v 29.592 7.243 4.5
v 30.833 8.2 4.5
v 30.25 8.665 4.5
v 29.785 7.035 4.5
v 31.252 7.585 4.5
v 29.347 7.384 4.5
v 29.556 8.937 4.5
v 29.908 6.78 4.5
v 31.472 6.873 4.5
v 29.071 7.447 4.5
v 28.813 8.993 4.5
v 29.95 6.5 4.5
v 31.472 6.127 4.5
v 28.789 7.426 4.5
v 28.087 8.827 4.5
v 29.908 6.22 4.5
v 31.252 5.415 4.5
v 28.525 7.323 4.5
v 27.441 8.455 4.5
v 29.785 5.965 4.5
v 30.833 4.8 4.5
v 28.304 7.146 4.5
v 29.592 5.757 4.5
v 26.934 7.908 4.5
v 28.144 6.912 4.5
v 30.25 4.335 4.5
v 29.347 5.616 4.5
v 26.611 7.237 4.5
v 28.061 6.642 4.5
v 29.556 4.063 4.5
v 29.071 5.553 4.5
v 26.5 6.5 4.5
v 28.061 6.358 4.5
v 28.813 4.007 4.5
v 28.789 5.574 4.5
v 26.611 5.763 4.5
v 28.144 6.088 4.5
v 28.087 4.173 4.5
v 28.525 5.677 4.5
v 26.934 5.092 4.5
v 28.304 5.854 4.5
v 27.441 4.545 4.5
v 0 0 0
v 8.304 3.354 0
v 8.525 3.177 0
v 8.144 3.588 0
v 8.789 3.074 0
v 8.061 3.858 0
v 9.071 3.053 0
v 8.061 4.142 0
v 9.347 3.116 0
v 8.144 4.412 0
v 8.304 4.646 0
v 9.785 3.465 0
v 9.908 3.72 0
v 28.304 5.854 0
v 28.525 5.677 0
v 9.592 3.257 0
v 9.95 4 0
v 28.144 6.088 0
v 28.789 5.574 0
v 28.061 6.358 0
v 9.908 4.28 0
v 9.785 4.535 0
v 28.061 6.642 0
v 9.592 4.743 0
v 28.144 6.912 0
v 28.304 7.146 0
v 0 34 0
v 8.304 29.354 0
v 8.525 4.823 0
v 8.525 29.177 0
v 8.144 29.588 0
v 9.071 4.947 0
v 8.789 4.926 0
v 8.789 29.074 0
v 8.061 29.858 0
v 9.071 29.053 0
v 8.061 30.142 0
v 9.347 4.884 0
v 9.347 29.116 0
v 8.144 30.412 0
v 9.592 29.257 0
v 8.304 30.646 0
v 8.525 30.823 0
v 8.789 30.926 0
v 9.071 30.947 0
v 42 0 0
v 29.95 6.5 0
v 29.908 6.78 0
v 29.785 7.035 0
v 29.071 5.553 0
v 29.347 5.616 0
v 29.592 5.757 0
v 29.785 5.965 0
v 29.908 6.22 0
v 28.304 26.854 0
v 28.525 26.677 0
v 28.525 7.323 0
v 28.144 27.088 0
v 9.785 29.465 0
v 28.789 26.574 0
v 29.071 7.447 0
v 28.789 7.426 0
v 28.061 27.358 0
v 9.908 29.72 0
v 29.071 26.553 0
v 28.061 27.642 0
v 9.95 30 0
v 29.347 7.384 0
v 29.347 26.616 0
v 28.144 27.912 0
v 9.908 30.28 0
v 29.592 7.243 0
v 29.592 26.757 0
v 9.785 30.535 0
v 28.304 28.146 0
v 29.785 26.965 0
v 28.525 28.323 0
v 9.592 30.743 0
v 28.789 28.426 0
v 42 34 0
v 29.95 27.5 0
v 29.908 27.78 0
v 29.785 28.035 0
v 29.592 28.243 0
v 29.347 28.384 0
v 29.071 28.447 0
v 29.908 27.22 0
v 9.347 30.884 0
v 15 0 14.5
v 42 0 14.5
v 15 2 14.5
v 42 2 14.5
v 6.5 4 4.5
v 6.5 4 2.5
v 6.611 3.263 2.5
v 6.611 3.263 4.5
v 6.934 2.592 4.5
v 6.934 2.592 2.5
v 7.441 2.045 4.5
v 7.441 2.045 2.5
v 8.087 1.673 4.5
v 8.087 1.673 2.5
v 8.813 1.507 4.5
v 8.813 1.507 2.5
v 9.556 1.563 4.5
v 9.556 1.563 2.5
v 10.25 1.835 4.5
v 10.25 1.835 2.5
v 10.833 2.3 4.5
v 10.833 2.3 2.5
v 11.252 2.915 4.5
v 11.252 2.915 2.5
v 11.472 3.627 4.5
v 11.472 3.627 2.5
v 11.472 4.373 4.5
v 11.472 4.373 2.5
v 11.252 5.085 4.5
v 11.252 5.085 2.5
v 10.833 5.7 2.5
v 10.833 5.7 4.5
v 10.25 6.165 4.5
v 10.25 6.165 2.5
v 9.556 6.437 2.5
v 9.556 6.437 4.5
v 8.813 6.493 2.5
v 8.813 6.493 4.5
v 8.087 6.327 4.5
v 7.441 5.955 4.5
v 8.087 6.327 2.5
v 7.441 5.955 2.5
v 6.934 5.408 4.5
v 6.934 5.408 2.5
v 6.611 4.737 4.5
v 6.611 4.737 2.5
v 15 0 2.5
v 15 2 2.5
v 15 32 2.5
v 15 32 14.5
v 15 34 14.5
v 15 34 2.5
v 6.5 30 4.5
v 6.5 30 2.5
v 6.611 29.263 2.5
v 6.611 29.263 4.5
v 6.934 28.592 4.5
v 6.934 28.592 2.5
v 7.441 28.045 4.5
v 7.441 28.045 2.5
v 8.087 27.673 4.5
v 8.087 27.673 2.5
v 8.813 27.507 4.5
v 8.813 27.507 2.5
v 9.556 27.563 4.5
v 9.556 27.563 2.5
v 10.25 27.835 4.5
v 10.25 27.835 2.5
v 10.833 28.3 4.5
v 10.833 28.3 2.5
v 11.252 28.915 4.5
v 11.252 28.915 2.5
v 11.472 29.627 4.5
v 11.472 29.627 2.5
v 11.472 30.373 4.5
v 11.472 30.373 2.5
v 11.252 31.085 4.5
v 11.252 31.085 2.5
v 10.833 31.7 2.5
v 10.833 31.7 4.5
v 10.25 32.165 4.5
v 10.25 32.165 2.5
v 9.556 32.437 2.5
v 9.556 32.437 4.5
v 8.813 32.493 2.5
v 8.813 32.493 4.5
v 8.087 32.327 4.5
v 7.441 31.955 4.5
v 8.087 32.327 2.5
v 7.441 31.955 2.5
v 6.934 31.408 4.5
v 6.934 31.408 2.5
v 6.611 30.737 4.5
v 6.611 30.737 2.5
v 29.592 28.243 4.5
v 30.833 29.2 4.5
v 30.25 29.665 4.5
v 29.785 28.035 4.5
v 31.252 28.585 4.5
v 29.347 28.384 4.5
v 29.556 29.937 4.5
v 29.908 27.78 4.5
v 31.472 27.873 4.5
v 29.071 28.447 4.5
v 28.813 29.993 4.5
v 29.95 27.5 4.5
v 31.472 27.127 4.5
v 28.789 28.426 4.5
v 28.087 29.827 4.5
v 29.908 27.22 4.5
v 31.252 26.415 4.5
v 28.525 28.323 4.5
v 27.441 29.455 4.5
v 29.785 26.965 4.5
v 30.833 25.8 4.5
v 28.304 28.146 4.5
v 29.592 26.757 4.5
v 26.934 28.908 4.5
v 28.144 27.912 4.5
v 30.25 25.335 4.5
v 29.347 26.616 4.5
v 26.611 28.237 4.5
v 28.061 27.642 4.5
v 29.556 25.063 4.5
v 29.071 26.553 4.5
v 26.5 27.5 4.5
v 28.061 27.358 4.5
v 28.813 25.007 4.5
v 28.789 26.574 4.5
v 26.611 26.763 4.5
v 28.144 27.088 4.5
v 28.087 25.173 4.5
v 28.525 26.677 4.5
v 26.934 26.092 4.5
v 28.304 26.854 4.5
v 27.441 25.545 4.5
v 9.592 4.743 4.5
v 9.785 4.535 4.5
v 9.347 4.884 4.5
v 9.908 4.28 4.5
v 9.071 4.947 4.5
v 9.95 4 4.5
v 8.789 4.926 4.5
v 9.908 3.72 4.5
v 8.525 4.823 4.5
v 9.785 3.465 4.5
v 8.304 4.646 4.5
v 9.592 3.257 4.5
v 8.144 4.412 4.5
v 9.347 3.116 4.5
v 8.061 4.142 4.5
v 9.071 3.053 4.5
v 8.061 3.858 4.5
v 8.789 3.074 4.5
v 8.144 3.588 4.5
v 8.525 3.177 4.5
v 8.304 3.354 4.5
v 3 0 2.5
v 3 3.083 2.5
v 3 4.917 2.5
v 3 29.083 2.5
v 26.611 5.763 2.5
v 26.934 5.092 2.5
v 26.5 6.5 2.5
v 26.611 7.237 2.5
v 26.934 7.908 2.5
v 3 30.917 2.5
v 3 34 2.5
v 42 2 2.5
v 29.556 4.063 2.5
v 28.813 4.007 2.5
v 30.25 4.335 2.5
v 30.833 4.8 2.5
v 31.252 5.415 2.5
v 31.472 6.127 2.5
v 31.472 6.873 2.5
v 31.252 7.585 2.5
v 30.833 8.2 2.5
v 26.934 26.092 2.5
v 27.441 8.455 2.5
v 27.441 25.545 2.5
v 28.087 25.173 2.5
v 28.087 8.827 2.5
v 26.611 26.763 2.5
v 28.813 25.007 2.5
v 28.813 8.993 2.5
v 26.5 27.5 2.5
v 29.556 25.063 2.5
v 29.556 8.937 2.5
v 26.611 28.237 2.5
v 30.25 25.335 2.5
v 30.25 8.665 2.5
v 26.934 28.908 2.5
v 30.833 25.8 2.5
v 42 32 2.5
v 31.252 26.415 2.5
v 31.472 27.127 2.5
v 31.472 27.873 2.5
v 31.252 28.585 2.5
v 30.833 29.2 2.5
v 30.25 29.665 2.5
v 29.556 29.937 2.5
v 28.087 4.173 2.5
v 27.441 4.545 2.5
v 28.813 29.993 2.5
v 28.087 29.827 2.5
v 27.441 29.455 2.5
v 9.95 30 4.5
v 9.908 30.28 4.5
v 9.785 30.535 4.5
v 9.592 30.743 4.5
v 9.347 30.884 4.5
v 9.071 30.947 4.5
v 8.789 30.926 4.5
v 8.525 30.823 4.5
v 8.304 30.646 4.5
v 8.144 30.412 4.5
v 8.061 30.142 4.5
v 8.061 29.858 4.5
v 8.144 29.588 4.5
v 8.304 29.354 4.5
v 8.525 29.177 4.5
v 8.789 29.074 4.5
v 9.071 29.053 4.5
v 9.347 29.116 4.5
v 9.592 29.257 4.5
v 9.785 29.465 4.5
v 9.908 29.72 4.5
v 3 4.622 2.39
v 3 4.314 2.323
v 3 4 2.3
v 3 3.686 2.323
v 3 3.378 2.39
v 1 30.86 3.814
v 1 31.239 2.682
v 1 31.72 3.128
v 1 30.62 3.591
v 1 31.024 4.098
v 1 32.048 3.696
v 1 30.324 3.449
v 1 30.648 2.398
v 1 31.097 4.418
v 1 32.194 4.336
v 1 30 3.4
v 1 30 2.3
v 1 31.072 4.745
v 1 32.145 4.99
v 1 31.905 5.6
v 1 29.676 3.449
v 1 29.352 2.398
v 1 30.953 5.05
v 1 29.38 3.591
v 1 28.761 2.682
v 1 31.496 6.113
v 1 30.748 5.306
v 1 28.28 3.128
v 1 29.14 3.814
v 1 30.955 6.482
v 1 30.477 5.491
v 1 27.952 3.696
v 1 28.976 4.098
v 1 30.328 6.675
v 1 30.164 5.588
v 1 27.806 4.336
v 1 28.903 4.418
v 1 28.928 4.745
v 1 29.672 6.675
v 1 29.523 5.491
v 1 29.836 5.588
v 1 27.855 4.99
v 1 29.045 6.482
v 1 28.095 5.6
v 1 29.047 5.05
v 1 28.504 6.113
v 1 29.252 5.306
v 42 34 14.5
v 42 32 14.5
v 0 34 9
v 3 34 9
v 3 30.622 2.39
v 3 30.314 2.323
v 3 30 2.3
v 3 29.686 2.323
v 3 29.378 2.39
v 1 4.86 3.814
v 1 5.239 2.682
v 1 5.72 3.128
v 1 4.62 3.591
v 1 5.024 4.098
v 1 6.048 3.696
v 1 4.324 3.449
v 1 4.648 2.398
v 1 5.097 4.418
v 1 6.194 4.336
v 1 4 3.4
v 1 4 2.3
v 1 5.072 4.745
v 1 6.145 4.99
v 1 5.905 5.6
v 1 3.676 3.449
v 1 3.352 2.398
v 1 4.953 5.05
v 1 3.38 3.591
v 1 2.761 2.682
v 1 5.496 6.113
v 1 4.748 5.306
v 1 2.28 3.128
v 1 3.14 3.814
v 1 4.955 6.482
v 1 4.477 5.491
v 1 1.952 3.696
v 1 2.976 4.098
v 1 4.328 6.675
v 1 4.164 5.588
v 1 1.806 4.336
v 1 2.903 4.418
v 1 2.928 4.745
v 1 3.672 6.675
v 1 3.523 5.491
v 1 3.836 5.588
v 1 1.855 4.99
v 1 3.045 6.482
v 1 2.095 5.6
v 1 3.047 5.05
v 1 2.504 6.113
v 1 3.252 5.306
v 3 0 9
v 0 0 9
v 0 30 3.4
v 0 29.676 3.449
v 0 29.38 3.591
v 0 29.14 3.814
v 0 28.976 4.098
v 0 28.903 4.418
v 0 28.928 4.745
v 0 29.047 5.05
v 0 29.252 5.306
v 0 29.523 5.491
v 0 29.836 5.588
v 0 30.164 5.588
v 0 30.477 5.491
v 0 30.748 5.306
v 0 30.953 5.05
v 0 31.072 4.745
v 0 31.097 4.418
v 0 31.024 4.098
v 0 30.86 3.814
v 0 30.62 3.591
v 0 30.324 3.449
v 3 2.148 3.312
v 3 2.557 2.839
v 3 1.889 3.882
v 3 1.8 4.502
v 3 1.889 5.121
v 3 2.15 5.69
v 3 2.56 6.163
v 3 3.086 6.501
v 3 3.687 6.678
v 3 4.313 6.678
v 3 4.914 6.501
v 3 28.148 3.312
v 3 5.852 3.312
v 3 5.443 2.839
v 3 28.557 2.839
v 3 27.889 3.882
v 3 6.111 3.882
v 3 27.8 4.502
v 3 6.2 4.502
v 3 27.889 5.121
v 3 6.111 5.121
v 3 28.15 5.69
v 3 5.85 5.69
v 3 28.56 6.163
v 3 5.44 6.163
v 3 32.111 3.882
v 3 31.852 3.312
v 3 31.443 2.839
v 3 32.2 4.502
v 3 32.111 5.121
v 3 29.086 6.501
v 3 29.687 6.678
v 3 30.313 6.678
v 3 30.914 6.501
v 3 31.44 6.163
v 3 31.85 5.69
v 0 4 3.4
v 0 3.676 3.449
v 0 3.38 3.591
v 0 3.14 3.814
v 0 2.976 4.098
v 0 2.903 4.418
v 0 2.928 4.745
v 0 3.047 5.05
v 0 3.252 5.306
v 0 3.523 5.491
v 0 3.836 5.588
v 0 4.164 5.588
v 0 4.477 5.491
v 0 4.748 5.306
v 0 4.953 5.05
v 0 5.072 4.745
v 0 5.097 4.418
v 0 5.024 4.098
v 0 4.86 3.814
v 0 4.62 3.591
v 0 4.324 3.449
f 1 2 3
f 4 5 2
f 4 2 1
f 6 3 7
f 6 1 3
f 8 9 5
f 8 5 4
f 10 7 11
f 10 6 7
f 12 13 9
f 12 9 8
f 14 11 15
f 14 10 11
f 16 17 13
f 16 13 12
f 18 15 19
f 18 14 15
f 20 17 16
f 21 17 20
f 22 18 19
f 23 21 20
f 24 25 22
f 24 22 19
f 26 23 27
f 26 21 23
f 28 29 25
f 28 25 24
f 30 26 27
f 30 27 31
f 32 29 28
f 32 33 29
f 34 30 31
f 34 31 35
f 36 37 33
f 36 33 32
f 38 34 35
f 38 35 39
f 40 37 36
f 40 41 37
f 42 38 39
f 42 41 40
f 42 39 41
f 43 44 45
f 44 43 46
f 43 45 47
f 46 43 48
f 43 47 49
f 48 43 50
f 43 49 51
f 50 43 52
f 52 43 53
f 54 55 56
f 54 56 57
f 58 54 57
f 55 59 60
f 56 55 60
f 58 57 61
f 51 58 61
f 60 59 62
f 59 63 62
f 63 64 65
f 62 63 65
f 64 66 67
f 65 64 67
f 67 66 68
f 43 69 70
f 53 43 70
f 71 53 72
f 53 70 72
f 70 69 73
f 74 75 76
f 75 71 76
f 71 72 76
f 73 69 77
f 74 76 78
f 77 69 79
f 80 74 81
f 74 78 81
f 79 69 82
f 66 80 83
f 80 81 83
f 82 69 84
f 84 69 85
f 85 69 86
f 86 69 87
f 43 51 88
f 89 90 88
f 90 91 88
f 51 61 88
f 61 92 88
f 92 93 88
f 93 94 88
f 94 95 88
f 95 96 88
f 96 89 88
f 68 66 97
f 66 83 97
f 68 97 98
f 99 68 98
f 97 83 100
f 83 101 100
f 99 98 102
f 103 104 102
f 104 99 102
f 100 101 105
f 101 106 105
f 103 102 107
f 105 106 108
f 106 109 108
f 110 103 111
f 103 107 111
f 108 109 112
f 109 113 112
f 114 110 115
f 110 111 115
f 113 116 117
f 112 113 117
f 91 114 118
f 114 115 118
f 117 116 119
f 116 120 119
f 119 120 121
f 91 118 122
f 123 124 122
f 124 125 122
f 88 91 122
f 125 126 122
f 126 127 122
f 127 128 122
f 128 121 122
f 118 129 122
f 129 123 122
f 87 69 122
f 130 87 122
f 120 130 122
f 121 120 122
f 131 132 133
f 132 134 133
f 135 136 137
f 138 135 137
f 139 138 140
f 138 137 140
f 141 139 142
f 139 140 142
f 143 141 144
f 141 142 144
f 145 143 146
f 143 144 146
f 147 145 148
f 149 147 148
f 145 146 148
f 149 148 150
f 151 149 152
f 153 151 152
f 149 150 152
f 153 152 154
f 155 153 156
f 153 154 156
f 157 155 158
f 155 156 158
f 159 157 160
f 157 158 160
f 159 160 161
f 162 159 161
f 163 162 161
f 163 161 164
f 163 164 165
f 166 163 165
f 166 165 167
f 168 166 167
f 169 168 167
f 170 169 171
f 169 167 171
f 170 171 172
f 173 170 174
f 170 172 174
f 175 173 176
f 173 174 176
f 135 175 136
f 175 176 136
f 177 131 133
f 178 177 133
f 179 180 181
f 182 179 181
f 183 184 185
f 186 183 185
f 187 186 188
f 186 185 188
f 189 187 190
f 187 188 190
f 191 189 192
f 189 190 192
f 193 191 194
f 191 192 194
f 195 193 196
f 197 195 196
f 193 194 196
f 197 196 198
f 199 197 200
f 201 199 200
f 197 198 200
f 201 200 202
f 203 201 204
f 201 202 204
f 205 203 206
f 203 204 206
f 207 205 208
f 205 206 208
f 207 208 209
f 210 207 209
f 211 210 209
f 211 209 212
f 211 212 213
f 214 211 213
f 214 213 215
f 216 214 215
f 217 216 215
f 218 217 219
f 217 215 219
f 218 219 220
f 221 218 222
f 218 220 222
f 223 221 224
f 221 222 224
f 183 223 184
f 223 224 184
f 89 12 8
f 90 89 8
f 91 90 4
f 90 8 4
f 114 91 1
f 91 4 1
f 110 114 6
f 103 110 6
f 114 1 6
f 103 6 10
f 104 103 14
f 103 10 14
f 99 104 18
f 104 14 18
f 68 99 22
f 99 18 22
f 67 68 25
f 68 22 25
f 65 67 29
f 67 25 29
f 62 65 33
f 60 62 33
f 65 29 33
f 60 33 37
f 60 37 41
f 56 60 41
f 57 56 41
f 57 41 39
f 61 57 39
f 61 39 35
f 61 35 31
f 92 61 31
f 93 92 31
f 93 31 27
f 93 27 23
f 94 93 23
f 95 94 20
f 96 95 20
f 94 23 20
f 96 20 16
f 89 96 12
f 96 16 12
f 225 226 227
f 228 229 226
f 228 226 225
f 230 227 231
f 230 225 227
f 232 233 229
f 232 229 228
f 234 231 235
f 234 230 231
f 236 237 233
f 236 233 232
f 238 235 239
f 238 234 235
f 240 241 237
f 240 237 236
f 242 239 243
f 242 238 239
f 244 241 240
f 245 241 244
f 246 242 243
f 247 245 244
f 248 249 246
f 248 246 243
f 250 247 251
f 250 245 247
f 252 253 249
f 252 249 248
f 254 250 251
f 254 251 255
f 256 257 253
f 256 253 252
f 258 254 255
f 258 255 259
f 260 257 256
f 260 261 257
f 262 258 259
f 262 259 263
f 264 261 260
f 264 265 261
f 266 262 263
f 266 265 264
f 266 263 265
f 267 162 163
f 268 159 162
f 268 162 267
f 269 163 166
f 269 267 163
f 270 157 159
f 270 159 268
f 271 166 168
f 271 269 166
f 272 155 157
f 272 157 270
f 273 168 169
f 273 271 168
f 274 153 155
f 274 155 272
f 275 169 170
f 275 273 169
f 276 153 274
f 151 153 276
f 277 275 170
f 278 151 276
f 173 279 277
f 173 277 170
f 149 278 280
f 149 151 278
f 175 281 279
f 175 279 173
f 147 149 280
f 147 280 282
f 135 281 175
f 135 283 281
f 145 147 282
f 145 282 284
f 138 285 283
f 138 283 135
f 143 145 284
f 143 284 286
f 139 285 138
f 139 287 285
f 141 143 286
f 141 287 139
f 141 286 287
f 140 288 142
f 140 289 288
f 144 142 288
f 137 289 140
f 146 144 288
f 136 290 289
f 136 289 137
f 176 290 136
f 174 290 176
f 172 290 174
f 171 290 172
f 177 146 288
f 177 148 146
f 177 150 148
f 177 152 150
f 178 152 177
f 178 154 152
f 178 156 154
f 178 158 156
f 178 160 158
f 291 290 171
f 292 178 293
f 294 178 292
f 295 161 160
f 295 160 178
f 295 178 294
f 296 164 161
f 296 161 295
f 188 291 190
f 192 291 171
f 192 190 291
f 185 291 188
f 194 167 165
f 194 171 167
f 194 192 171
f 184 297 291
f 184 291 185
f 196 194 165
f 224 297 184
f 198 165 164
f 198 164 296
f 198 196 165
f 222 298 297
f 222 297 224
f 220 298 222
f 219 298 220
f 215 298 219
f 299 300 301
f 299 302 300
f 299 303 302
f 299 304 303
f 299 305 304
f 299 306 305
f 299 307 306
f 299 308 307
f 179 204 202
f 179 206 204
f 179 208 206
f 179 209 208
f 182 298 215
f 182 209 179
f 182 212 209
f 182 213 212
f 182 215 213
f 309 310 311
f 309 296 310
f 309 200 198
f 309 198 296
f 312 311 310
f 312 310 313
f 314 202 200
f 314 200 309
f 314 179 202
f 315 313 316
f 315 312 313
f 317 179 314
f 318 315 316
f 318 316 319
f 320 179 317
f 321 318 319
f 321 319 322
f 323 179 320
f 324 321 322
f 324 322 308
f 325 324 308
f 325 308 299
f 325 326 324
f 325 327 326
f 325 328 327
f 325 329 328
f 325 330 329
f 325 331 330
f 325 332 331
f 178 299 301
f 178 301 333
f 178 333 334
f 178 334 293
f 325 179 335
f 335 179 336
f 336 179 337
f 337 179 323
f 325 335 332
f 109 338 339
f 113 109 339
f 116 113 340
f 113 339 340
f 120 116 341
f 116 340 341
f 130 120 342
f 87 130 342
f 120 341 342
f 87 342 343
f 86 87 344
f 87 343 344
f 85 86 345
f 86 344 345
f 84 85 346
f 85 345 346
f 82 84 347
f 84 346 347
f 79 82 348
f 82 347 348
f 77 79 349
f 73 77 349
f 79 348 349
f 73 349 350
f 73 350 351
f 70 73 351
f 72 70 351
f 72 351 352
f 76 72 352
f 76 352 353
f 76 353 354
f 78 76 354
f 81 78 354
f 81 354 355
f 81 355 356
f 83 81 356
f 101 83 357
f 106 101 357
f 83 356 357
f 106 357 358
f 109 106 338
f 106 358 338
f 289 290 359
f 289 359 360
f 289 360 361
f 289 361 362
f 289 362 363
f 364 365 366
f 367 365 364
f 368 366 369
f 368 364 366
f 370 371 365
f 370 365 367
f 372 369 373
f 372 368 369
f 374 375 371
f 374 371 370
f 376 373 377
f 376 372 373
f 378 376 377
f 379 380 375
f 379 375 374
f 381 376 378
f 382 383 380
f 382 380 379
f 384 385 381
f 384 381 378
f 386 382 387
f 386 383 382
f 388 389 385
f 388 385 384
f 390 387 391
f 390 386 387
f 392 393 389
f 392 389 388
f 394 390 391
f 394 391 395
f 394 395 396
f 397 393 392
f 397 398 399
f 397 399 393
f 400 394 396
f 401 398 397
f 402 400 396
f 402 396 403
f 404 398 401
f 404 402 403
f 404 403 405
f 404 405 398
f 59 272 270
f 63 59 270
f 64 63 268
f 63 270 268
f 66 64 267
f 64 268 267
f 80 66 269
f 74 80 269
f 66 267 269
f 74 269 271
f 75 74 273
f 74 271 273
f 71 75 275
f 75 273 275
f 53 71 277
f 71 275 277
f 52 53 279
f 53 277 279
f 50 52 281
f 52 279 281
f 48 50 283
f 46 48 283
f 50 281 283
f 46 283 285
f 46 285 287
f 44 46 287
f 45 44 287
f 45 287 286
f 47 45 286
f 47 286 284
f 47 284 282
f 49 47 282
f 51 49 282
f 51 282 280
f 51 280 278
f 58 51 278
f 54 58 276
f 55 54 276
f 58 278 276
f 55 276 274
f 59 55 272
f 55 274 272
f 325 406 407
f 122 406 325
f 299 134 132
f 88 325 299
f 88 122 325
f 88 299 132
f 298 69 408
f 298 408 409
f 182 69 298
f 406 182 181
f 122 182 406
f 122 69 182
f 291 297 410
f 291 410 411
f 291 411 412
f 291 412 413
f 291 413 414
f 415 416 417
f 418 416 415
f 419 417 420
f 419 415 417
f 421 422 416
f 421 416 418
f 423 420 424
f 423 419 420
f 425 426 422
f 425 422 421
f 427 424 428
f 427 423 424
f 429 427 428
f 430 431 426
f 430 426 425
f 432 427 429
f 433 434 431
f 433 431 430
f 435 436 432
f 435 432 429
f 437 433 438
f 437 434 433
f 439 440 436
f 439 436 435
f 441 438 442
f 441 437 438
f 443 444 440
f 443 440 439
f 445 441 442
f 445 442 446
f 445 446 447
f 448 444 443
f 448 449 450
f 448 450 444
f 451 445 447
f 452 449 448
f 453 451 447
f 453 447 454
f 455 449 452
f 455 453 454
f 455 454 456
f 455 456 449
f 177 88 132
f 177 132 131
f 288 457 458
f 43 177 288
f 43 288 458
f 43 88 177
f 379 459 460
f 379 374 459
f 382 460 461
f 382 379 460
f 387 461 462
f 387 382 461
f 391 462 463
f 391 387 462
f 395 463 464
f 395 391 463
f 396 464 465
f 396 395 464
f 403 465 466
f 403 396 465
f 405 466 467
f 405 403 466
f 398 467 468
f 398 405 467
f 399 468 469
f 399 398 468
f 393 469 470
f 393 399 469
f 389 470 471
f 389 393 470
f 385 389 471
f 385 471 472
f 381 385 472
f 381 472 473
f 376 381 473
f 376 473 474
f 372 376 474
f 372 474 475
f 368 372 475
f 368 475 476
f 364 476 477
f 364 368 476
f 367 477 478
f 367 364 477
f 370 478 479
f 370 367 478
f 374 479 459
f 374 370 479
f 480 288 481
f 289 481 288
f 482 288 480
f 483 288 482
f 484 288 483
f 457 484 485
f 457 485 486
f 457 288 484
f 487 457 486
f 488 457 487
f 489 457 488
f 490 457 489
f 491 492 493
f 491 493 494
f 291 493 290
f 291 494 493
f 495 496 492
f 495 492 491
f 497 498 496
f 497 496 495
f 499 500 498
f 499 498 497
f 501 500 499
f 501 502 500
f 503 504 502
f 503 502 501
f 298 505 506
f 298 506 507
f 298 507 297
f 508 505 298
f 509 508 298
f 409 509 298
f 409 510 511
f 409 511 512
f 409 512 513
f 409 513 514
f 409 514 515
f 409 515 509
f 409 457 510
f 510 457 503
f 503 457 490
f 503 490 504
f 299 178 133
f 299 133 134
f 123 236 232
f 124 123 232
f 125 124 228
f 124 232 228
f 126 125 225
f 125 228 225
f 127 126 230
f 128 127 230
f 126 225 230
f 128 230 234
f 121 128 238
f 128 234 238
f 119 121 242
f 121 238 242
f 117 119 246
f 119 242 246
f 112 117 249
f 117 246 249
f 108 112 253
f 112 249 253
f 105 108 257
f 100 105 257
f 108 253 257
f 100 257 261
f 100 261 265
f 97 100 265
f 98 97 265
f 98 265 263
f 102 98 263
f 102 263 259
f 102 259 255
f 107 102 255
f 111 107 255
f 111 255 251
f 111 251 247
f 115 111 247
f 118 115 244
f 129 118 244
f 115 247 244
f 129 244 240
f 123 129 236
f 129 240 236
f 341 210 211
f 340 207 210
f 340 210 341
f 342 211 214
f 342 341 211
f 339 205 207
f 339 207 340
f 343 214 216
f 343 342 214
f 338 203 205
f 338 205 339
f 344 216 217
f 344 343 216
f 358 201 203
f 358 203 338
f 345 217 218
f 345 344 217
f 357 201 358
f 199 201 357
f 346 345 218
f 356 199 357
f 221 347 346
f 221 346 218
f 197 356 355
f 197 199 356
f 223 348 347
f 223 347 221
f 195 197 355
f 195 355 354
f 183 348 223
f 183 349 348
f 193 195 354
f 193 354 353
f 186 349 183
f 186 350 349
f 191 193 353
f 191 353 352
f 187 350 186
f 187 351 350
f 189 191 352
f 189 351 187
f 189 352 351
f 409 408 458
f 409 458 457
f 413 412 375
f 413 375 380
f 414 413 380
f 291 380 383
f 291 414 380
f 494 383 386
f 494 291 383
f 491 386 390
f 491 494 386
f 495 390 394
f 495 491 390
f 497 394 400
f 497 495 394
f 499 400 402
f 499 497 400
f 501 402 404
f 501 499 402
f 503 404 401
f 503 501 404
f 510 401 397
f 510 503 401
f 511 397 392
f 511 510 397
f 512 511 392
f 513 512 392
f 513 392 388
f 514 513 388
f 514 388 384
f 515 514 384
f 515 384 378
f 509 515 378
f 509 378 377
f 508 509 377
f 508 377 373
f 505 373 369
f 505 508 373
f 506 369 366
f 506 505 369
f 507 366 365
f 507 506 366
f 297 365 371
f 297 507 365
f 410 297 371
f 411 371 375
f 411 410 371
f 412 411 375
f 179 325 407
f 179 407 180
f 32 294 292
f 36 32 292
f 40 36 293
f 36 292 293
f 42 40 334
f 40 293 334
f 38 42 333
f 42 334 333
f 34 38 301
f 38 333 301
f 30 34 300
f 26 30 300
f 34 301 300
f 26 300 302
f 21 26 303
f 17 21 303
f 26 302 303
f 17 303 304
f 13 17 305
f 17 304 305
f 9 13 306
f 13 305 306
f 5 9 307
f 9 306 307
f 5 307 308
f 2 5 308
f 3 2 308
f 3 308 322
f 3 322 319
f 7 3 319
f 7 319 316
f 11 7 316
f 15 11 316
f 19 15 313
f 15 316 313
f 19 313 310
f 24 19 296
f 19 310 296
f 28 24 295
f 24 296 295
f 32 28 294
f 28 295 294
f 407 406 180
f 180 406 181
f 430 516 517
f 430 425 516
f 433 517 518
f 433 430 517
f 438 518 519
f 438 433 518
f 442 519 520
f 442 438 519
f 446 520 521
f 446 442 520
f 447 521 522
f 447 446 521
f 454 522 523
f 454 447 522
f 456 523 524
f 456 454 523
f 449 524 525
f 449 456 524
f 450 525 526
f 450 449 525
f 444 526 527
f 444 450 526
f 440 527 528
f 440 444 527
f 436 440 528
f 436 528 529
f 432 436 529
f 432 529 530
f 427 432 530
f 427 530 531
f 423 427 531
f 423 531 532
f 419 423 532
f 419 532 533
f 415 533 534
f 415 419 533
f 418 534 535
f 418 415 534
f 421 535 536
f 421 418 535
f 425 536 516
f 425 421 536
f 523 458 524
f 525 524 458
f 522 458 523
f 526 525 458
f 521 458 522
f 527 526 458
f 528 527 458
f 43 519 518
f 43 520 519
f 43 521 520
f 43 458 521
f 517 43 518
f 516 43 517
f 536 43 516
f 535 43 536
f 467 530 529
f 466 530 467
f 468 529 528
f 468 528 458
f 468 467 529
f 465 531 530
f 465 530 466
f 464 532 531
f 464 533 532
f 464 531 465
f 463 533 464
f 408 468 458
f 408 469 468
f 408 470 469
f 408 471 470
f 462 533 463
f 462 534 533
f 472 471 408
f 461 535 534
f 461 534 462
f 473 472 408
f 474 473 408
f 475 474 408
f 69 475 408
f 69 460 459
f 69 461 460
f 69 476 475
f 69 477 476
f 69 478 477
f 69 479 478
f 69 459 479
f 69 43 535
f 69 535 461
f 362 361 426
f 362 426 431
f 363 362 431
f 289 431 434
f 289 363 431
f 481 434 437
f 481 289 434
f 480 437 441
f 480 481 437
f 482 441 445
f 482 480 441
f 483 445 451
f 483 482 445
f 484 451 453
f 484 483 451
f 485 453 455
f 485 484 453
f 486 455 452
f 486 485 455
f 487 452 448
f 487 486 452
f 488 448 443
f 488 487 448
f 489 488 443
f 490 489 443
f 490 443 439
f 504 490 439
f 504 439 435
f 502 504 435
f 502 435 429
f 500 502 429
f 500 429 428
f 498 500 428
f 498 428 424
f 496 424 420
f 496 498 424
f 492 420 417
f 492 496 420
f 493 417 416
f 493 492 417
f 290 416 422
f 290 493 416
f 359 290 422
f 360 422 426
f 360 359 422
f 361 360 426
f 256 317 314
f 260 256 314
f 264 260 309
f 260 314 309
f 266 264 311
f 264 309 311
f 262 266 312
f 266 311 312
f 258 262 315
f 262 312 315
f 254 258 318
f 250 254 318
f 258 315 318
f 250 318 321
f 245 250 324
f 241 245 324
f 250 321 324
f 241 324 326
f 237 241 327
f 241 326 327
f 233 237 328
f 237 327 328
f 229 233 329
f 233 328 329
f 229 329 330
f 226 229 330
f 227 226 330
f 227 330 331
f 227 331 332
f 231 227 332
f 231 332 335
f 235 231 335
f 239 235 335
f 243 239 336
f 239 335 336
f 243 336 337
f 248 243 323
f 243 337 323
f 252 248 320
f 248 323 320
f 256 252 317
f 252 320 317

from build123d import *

# Parameters (mm, degrees)
SKETCH1_W                     = 42
SKETCH1_H                     = 34
BOSS_EXTRUDE1_DEPTH           = 2.5
BOSS_EXTRUDE2_DEPTH           = 12
SKETCH3_W                     = 12
SKETCH3_H                     = 34
CUT_EXTRUDE1_DEPTH            = 12
CBORE_FOR_M2_SHCS1_AT_2_COUNT = 2
CBORE_FOR_M2_SHCS1_AT_2_PITCH = 26
SKETCH8_W                     = 3
SKETCH8_H                     = 34
CUT_EXTRUDE2_DEPTH            = 5.5
SKETCH9_R                     = 2.5
BOSS_EXTRUDE3_DEPTH           = 2
SKETCH10_R                    = 0.95
CUT_EXTRUDE3_DEPTH            = 4.5


with BuildPart() as part:
    # Sketch1 → Boss-Extrude1 (new body)
    with BuildSketch(Plane.XY):
        with Locations((21, 17)):
            Rectangle(SKETCH1_W, SKETCH1_H)
    extrude(amount=BOSS_EXTRUDE1_DEPTH)

    # Sketch2 → Boss-Extrude2 (add)
    with BuildSketch(Plane.XY.offset(2.5)):
        Polygon((0, 34), (42, 34), (42, 32), (3, 32), (3, 2), (42, 2), (42, 0), (0, 0), align=None)
    extrude(amount=BOSS_EXTRUDE2_DEPTH)

    # Sketch3 → Cut-Extrude1 (cut)
    with BuildSketch(Plane.XY.offset(14.5)):
        with Locations((9, 17)):
            Rectangle(SKETCH3_W, SKETCH3_H)
    extrude(amount=-CUT_EXTRUDE1_DEPTH, mode=Mode.SUBTRACT)

    # Sketch5 → CBORE for M2 SHCS1 (revolve, cut)
    with BuildSketch(Plane(origin=(3, 4, 4.5), x_dir=(0, 0, -1), z_dir=(0, 1, 0))):
        Polygon((0, 0), (0, 3), (1.1, 3), (1.1, 2), (2.2, 2), (2.2, 0), align=None)
    cbore_for_m2_shcs1 = revolve(axis=Axis((9.35, 4, 4.5), (-1, 0, 0)), mode=Mode.SUBTRACT)

    # CBORE for M2 SHCS1 at 2: CBORE for M2 SHCS1 ×2
    with Locations(*[(0, i * CBORE_FOR_M2_SHCS1_AT_2_PITCH, 0) for i in range(1, CBORE_FOR_M2_SHCS1_AT_2_COUNT)]):
        add(cbore_for_m2_shcs1, mode=Mode.SUBTRACT)

    # Sketch8 → Cut-Extrude2 (cut)
    with BuildSketch(Plane.XY.offset(14.5)):
        with Locations((1.5, 17)):
            Rectangle(SKETCH8_W, SKETCH8_H)
    extrude(amount=-CUT_EXTRUDE2_DEPTH, mode=Mode.SUBTRACT)

    # Sketch9 → Boss-Extrude3 (add)
    with BuildSketch(Plane.XY.offset(2.5)):
        with Locations(Location((9, 30, 0), (0, 0, 180))):
            Circle(SKETCH9_R)
        with Locations(Location((9, 4, 0), (0, 0, 180))):
            Circle(SKETCH9_R)
        with Locations(Location((29, 27.5, 0), (0, 0, 180))):
            Circle(SKETCH9_R)
        with Locations(Location((29, 6.5, 0), (0, 0, 180))):
            Circle(SKETCH9_R)
    extrude(amount=BOSS_EXTRUDE3_DEPTH)

    # Sketch10 → Cut-Extrude3 (cut)
    with BuildSketch(Plane.XY.offset(4.5)):
        with Locations((9, 30)):
            Circle(SKETCH10_R)
        with Locations((9, 4)):
            Circle(SKETCH10_R)
        with Locations((29, 27.5)):
            Circle(SKETCH10_R)
        with Locations((29, 6.5)):
            Circle(SKETCH10_R)
    extrude(amount=-CUT_EXTRUDE3_DEPTH, mode=Mode.SUBTRACT)


solid = part.part
